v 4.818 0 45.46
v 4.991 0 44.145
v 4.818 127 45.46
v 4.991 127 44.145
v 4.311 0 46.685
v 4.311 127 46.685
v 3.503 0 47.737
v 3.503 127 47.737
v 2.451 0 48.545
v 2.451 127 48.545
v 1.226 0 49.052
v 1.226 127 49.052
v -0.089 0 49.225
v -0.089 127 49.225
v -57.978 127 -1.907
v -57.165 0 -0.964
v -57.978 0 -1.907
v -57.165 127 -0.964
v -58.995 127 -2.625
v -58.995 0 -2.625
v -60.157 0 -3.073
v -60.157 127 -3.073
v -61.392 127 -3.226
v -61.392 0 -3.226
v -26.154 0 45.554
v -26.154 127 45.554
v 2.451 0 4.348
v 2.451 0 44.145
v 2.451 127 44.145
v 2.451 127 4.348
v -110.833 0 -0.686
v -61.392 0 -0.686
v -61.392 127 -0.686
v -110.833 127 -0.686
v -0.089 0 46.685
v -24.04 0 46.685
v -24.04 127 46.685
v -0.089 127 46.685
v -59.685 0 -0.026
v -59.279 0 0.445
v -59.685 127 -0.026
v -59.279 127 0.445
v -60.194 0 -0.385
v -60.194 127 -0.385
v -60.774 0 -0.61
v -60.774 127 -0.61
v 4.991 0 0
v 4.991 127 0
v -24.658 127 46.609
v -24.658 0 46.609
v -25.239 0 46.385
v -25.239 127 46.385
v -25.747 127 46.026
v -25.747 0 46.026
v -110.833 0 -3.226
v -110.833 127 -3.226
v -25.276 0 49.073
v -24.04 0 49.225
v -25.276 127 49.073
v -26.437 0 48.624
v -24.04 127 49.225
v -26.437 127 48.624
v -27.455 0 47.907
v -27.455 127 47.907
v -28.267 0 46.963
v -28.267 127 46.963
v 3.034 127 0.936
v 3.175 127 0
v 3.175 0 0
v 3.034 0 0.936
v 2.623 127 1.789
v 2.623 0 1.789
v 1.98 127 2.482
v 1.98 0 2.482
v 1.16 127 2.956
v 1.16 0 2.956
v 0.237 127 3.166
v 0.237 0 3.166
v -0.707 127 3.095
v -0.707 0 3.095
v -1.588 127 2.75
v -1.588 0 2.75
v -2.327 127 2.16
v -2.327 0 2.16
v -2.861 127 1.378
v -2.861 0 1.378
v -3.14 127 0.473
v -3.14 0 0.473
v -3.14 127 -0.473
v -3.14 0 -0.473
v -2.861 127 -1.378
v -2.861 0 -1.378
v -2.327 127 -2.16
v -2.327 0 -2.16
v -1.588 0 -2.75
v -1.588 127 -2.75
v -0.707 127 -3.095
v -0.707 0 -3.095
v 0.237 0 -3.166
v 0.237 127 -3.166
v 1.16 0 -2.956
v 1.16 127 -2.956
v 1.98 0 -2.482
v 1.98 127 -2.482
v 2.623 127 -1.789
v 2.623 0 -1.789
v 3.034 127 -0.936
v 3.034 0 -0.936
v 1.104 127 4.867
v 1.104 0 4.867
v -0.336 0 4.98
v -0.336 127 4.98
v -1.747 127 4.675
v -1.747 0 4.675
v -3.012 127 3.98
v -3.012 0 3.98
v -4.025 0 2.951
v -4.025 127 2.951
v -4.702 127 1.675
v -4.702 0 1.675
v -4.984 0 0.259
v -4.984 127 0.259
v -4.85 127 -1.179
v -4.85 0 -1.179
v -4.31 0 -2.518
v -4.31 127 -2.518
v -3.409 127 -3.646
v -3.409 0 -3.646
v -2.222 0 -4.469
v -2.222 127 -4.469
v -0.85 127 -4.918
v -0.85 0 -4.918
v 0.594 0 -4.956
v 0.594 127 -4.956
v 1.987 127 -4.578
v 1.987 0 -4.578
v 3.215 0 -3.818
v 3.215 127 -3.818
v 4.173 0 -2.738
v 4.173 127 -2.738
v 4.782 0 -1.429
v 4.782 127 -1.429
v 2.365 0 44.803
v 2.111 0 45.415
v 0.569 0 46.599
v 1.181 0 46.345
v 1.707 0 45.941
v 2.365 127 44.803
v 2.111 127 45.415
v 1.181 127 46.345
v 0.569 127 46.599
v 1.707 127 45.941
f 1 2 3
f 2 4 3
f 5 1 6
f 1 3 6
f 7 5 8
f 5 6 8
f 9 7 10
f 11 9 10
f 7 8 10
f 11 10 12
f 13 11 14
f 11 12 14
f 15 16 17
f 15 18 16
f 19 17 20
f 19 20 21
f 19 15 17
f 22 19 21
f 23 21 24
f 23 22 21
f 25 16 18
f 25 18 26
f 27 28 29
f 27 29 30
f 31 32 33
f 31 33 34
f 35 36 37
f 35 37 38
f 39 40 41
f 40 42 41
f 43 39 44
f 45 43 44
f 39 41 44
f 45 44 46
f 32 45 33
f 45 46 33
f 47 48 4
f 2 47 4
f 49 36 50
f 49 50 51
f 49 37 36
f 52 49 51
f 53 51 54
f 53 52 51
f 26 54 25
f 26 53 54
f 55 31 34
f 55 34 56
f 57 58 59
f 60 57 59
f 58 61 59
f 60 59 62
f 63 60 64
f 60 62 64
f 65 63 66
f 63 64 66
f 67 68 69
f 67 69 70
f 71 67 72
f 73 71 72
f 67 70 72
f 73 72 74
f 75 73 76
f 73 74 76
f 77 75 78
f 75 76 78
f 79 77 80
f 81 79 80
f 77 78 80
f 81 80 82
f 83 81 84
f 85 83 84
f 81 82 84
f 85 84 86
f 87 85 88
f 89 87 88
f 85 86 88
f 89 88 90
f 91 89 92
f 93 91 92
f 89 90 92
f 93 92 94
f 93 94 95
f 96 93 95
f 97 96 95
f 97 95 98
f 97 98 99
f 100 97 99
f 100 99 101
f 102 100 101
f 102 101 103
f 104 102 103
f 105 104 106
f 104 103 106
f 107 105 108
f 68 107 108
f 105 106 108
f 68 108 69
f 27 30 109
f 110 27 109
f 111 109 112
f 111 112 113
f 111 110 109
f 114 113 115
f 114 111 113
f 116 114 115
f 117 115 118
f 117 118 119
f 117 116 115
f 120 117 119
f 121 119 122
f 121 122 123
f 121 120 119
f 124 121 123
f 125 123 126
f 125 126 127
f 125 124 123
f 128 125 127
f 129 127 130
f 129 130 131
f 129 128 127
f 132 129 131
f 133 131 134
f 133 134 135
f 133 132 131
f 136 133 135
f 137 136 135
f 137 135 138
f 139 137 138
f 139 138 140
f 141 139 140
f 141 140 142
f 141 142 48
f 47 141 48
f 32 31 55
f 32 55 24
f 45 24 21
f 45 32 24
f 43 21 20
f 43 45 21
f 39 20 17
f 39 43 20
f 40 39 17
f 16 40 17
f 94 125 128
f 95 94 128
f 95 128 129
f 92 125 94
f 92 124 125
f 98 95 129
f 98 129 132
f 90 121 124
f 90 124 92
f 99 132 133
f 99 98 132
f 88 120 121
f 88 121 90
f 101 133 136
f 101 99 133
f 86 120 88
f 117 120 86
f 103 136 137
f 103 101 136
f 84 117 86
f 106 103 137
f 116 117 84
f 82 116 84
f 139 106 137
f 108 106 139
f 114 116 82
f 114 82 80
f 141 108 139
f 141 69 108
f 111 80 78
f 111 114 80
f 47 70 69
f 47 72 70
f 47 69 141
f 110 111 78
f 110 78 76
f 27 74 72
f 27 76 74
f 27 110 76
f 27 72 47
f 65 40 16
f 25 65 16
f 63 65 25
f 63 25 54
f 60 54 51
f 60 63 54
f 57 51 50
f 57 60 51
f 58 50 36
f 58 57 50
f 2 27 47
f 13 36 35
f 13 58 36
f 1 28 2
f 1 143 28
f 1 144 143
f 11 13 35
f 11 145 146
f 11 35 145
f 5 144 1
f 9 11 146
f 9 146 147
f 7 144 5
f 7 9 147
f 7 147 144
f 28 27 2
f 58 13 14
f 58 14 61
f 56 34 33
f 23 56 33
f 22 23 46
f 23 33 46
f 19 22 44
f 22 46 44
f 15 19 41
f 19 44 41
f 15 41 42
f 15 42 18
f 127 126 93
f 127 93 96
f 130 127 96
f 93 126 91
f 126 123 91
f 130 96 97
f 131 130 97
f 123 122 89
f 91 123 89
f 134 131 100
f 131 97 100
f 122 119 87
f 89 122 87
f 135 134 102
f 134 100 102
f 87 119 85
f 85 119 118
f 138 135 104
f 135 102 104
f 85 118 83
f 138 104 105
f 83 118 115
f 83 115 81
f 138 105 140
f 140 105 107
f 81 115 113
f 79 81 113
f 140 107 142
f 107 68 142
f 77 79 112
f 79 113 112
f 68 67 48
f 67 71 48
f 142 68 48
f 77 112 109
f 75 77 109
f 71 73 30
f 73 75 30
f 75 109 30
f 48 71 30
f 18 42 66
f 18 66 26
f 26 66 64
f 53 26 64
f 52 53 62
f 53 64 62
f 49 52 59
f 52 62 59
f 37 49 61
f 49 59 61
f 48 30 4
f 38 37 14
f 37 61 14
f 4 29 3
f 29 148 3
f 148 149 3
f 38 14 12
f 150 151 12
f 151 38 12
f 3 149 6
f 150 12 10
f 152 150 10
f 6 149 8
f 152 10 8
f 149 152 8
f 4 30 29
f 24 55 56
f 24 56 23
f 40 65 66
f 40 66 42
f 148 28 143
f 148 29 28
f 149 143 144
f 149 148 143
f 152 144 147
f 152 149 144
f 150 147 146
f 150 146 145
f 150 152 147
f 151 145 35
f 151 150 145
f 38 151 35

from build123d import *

# Parameters (mm, degrees)
F0_R     = 3.175
F1_DEPTH = 127
F2_R     = 5.08
F3_R     = 2.54


with BuildPart() as f1:
    # F0 (on Front) → F1 (new body)
    with BuildSketch(Plane.XZ):
        with BuildLine():
            ThreePointArc((2.4511, 4.34778), (4.309569, 2.517677), (4.9911, 0))
            Line((4.9911, 0), (4.9911, 49.2252))
            Line((4.9911, 49.2252), (-26.7589, 49.2252))
            Line((-26.7589, 49.2252), (-60.0329, -0.6858))
            Line((-60.0329, -0.6858), (-110.8329, -0.6858))
            Line((-110.8329, -0.6858), (-110.8329, -3.2258))
            Line((-110.8329, -3.2258), (-58.673533, -3.2258))
            Line((-58.673533, -3.2258), (-25.399533, 46.6852))
            Line((-25.399533, 46.6852), (2.4511, 46.6852))
            Line((2.4511, 46.6852), (2.4511, 4.34778))
        make_face()
        with BuildLine():
            ThreePointArc((2.4511, 4.34778), (-4.309569, -2.517677), (4.9911, 0))
            ThreePointArc((4.9911, 0), (4.309569, 2.517677), (2.4511, 4.34778))
        make_face()
        Circle(F0_R, mode=Mode.SUBTRACT)
    extrude(amount=-F1_DEPTH)

    # F2
    f2_edges = [f1.edges().sort_by_distance(p)[0] for p in [
        (-26.7589, 63.5, 49.2252),
        (4.9911, 63.5, 49.2252),
        (-58.673533, 63.5, -3.2258),
    ]]
    fillet(f2_edges, radius=F2_R)

    # F3
    f3_edges = [f1.edges().sort_by_distance(p)[0] for p in [
        (2.4511, 63.5, 46.6852),
        (-25.399533, 63.5, 46.6852),
        (-60.0329, 63.5, -0.6858),
    ]]
    fillet(f3_edges, radius=F3_R)


solid = f1.part
